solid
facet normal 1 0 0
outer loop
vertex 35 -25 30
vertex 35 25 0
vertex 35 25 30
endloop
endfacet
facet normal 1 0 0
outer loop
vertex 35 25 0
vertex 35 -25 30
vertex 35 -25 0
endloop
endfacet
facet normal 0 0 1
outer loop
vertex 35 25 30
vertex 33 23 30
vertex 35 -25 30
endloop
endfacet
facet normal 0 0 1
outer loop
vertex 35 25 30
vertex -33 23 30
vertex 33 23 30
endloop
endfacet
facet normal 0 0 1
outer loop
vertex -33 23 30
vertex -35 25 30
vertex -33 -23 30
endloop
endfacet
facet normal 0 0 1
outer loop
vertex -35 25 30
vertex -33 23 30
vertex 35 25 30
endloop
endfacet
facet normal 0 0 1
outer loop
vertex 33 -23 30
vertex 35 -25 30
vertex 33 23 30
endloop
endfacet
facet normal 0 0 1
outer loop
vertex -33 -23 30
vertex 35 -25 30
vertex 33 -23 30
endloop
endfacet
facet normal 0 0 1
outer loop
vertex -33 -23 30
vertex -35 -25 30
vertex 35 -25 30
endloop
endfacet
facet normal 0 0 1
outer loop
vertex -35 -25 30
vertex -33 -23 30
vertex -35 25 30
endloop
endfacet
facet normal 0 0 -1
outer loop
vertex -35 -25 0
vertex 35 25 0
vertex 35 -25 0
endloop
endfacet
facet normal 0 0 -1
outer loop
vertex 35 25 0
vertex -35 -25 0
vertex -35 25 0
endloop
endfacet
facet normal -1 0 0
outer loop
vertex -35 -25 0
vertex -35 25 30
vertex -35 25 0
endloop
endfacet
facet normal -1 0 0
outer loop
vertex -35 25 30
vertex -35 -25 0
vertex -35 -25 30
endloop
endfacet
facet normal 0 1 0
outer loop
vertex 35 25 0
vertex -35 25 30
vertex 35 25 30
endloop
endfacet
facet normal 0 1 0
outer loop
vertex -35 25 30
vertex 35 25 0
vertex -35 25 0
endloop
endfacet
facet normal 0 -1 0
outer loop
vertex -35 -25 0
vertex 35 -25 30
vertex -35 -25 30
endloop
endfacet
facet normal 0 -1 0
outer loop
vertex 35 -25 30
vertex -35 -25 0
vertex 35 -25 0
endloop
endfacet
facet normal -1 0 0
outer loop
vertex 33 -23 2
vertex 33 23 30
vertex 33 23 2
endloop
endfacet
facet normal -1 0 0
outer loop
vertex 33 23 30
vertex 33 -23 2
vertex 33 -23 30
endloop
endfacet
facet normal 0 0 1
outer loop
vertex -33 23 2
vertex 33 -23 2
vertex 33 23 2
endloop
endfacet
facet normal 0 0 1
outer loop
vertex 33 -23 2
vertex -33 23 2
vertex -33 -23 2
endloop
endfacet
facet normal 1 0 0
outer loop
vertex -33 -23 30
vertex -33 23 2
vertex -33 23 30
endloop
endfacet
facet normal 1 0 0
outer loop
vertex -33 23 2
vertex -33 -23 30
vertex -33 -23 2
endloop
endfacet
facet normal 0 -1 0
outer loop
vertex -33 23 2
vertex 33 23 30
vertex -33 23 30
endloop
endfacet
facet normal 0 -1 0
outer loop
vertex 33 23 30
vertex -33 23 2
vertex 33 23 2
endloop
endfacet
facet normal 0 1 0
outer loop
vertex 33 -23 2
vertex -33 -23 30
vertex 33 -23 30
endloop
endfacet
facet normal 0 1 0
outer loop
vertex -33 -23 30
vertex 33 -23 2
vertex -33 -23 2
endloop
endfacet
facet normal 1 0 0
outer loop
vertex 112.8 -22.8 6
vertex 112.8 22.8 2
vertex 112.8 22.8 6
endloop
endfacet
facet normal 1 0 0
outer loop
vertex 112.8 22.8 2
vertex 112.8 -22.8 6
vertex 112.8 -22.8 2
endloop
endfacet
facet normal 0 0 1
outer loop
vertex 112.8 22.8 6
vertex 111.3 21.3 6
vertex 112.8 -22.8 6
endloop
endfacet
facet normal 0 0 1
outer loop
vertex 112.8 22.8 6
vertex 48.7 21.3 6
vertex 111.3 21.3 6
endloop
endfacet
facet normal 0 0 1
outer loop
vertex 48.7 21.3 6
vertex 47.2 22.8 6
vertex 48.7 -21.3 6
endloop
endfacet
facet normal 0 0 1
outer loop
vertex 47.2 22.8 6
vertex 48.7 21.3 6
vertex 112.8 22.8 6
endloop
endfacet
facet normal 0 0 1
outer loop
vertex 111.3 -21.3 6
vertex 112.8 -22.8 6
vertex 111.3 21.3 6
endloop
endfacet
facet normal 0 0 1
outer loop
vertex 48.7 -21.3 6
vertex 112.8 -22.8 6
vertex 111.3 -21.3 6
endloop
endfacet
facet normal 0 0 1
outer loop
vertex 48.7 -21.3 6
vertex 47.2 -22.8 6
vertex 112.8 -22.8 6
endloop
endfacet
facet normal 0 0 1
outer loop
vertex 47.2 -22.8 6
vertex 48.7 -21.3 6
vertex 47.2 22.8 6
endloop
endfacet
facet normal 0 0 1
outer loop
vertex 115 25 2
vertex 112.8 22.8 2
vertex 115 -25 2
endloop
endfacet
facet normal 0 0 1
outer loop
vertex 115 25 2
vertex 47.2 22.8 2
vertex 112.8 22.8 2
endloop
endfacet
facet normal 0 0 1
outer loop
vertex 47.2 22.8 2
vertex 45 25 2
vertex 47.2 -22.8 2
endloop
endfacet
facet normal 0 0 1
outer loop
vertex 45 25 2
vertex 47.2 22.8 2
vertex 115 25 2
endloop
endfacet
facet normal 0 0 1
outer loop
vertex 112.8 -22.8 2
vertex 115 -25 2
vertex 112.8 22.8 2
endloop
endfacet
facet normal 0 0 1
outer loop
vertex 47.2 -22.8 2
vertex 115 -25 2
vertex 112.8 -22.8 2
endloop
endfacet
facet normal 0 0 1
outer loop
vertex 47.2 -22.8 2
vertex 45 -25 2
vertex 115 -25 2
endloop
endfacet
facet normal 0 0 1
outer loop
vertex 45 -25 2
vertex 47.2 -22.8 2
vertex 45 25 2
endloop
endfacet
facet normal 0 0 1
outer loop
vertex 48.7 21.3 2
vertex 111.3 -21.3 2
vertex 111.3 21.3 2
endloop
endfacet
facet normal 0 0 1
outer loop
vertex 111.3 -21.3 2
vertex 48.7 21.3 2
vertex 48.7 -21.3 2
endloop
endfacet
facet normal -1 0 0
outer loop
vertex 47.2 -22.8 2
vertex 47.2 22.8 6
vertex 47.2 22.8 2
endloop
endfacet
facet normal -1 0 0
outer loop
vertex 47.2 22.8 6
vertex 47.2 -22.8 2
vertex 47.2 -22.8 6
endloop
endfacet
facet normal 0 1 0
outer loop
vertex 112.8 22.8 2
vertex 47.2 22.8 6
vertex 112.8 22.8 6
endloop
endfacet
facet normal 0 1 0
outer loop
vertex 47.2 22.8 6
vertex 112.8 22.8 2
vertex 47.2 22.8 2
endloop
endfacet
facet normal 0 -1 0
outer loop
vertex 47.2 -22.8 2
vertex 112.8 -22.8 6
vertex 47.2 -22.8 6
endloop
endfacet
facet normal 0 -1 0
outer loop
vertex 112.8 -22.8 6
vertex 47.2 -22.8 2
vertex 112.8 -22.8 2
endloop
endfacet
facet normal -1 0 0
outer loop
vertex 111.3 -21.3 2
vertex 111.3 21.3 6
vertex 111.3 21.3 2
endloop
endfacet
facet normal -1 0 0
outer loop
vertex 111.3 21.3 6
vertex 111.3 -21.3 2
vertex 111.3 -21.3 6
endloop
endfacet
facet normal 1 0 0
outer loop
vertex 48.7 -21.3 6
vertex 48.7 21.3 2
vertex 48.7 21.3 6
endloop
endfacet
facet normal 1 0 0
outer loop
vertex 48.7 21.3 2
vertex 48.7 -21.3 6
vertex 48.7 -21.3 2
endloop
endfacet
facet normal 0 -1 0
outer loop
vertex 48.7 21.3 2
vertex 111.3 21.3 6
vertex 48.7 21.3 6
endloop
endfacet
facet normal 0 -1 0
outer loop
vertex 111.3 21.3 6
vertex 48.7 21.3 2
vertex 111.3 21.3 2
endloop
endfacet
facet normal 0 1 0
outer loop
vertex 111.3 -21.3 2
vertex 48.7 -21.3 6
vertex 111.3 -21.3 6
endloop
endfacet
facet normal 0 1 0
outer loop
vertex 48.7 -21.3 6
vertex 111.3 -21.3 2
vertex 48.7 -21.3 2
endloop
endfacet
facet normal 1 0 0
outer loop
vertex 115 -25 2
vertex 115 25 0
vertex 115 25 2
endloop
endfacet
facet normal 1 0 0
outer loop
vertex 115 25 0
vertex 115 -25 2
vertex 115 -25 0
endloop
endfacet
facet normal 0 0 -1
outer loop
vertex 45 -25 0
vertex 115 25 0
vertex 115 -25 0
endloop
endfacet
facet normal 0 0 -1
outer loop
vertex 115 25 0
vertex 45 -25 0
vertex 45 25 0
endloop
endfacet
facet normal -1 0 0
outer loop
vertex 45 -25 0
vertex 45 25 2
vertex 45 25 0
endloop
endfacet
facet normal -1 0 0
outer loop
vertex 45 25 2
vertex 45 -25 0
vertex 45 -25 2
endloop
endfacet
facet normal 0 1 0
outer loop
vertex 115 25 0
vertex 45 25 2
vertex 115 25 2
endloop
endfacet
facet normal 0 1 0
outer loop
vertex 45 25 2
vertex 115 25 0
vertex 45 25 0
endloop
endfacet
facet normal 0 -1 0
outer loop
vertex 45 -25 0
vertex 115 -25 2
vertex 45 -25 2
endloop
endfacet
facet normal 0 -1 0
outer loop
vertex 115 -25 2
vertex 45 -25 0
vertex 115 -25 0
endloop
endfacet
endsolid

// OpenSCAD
// Variables for Box
box_x = 70;
box_y = 50;
box_z = 30;
wall_thick = 2;
floor_thick = 2;

// Variables for Lid
lid_x = 70;
lid_y = 50;
lid_plate_thick = 2;
lip_outer_x = 65.6;
lip_outer_y = 45.6;
lip_wall_thick = 1.5;
lip_height = 4;

// Layout
gap = 10;

// Global
$fn = 64;

// Box Module
module box() {
    // Outer shape
    difference() {
        cube([box_x, box_y, box_z], center = false);
        // Inner cutout (walls and floor)
        // Inner dimensions
        inner_x = box_x - 2 * wall_thick;
        inner_y = box_y - 2 * wall_thick;
        inner_z = box_z - floor_thick;
        // Position inner cutout above floor
        translate([wall_thick, wall_thick, floor_thick]) {
            cube([inner_x, inner_y, inner_z], center = false);
        }
    }
}

// Lid Module
module lid() {
    union() {
        // Plate
        cube([lid_x, lid_y, lid_plate_thick], center = false);
        // Lip
        lip_inner_x = lip_outer_x - 2 * lip_wall_thick;
        lip_inner_y = lip_outer_y - 2 * lip_wall_thick;
        translate([
            (lid_x - lip_outer_x) / 2,
            (lid_y - lip_outer_y) / 2,
            lid_plate_thick
        ]) {
            difference() {
                cube([lip_outer_x, lip_outer_y, lip_height], center = false);
                translate([lip_wall_thick, lip_wall_thick, 0]) {
                    cube([lip_inner_x, lip_inner_y, lip_height], center = false);
                }
            }
        }
    }
}

// Main Script
// Box centered at origin
translate([-box_x / 2, -box_y / 2, 0]) {
    box();
}

// Lid on +X side with gap
translate([
    box_x / 2 + gap,
    -lid_y / 2,
    0
]) {
    lid();
}
